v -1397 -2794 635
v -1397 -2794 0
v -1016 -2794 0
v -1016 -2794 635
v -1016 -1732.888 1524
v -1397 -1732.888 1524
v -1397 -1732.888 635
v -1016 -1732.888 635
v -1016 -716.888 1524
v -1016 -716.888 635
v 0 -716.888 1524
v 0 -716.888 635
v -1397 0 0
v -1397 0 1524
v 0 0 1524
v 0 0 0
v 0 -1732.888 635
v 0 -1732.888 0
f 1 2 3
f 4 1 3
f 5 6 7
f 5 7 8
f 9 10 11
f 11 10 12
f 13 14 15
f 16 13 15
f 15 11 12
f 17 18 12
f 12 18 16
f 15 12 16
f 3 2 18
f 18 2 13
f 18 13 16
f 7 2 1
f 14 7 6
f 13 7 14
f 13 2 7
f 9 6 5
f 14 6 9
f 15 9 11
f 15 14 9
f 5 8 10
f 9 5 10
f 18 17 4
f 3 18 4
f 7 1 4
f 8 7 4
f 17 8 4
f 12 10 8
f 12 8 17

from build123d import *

# Parameters (mm, degrees)
F0_W     = 1397
F0_H     = 2794
F1_DEPTH = 635
F2_W     = 1397
F2_H     = 716.887832
F3_DEPTH = 889
F4_W     = 381
F4_H     = 1016
F5_DEPTH = 889
F7_DEPTH = 635


with BuildPart() as f1:
    # F0 (on Top) → F1 (new body)
    with BuildSketch(Plane.XY):
        with Locations((-698.5, -1397)):
            Rectangle(F0_W, F0_H)
    extrude(amount=F1_DEPTH)

    # F2 (on face) → F3 (join)
    with BuildSketch(Plane.XY.offset(635)):
        with Locations((-698.5, -358.443916)):
            Rectangle(F2_W, F2_H)
    extrude(amount=F3_DEPTH)

    # F4 (on face) → F5 (join)
    with BuildSketch(Plane.XY.offset(635)):
        with Locations((-1206.5, -1224.887832)):
            Rectangle(F4_W, F4_H)
    extrude(amount=F5_DEPTH)

    # F6 (on face) → F7 (cut)
    with BuildSketch(Plane.XY.offset(635)):
        Polygon((0, -2794), (0, -1732.887832), (-1016, -2794), align=None)
    extrude(amount=-F7_DEPTH, mode=Mode.SUBTRACT)


solid = f1.part
